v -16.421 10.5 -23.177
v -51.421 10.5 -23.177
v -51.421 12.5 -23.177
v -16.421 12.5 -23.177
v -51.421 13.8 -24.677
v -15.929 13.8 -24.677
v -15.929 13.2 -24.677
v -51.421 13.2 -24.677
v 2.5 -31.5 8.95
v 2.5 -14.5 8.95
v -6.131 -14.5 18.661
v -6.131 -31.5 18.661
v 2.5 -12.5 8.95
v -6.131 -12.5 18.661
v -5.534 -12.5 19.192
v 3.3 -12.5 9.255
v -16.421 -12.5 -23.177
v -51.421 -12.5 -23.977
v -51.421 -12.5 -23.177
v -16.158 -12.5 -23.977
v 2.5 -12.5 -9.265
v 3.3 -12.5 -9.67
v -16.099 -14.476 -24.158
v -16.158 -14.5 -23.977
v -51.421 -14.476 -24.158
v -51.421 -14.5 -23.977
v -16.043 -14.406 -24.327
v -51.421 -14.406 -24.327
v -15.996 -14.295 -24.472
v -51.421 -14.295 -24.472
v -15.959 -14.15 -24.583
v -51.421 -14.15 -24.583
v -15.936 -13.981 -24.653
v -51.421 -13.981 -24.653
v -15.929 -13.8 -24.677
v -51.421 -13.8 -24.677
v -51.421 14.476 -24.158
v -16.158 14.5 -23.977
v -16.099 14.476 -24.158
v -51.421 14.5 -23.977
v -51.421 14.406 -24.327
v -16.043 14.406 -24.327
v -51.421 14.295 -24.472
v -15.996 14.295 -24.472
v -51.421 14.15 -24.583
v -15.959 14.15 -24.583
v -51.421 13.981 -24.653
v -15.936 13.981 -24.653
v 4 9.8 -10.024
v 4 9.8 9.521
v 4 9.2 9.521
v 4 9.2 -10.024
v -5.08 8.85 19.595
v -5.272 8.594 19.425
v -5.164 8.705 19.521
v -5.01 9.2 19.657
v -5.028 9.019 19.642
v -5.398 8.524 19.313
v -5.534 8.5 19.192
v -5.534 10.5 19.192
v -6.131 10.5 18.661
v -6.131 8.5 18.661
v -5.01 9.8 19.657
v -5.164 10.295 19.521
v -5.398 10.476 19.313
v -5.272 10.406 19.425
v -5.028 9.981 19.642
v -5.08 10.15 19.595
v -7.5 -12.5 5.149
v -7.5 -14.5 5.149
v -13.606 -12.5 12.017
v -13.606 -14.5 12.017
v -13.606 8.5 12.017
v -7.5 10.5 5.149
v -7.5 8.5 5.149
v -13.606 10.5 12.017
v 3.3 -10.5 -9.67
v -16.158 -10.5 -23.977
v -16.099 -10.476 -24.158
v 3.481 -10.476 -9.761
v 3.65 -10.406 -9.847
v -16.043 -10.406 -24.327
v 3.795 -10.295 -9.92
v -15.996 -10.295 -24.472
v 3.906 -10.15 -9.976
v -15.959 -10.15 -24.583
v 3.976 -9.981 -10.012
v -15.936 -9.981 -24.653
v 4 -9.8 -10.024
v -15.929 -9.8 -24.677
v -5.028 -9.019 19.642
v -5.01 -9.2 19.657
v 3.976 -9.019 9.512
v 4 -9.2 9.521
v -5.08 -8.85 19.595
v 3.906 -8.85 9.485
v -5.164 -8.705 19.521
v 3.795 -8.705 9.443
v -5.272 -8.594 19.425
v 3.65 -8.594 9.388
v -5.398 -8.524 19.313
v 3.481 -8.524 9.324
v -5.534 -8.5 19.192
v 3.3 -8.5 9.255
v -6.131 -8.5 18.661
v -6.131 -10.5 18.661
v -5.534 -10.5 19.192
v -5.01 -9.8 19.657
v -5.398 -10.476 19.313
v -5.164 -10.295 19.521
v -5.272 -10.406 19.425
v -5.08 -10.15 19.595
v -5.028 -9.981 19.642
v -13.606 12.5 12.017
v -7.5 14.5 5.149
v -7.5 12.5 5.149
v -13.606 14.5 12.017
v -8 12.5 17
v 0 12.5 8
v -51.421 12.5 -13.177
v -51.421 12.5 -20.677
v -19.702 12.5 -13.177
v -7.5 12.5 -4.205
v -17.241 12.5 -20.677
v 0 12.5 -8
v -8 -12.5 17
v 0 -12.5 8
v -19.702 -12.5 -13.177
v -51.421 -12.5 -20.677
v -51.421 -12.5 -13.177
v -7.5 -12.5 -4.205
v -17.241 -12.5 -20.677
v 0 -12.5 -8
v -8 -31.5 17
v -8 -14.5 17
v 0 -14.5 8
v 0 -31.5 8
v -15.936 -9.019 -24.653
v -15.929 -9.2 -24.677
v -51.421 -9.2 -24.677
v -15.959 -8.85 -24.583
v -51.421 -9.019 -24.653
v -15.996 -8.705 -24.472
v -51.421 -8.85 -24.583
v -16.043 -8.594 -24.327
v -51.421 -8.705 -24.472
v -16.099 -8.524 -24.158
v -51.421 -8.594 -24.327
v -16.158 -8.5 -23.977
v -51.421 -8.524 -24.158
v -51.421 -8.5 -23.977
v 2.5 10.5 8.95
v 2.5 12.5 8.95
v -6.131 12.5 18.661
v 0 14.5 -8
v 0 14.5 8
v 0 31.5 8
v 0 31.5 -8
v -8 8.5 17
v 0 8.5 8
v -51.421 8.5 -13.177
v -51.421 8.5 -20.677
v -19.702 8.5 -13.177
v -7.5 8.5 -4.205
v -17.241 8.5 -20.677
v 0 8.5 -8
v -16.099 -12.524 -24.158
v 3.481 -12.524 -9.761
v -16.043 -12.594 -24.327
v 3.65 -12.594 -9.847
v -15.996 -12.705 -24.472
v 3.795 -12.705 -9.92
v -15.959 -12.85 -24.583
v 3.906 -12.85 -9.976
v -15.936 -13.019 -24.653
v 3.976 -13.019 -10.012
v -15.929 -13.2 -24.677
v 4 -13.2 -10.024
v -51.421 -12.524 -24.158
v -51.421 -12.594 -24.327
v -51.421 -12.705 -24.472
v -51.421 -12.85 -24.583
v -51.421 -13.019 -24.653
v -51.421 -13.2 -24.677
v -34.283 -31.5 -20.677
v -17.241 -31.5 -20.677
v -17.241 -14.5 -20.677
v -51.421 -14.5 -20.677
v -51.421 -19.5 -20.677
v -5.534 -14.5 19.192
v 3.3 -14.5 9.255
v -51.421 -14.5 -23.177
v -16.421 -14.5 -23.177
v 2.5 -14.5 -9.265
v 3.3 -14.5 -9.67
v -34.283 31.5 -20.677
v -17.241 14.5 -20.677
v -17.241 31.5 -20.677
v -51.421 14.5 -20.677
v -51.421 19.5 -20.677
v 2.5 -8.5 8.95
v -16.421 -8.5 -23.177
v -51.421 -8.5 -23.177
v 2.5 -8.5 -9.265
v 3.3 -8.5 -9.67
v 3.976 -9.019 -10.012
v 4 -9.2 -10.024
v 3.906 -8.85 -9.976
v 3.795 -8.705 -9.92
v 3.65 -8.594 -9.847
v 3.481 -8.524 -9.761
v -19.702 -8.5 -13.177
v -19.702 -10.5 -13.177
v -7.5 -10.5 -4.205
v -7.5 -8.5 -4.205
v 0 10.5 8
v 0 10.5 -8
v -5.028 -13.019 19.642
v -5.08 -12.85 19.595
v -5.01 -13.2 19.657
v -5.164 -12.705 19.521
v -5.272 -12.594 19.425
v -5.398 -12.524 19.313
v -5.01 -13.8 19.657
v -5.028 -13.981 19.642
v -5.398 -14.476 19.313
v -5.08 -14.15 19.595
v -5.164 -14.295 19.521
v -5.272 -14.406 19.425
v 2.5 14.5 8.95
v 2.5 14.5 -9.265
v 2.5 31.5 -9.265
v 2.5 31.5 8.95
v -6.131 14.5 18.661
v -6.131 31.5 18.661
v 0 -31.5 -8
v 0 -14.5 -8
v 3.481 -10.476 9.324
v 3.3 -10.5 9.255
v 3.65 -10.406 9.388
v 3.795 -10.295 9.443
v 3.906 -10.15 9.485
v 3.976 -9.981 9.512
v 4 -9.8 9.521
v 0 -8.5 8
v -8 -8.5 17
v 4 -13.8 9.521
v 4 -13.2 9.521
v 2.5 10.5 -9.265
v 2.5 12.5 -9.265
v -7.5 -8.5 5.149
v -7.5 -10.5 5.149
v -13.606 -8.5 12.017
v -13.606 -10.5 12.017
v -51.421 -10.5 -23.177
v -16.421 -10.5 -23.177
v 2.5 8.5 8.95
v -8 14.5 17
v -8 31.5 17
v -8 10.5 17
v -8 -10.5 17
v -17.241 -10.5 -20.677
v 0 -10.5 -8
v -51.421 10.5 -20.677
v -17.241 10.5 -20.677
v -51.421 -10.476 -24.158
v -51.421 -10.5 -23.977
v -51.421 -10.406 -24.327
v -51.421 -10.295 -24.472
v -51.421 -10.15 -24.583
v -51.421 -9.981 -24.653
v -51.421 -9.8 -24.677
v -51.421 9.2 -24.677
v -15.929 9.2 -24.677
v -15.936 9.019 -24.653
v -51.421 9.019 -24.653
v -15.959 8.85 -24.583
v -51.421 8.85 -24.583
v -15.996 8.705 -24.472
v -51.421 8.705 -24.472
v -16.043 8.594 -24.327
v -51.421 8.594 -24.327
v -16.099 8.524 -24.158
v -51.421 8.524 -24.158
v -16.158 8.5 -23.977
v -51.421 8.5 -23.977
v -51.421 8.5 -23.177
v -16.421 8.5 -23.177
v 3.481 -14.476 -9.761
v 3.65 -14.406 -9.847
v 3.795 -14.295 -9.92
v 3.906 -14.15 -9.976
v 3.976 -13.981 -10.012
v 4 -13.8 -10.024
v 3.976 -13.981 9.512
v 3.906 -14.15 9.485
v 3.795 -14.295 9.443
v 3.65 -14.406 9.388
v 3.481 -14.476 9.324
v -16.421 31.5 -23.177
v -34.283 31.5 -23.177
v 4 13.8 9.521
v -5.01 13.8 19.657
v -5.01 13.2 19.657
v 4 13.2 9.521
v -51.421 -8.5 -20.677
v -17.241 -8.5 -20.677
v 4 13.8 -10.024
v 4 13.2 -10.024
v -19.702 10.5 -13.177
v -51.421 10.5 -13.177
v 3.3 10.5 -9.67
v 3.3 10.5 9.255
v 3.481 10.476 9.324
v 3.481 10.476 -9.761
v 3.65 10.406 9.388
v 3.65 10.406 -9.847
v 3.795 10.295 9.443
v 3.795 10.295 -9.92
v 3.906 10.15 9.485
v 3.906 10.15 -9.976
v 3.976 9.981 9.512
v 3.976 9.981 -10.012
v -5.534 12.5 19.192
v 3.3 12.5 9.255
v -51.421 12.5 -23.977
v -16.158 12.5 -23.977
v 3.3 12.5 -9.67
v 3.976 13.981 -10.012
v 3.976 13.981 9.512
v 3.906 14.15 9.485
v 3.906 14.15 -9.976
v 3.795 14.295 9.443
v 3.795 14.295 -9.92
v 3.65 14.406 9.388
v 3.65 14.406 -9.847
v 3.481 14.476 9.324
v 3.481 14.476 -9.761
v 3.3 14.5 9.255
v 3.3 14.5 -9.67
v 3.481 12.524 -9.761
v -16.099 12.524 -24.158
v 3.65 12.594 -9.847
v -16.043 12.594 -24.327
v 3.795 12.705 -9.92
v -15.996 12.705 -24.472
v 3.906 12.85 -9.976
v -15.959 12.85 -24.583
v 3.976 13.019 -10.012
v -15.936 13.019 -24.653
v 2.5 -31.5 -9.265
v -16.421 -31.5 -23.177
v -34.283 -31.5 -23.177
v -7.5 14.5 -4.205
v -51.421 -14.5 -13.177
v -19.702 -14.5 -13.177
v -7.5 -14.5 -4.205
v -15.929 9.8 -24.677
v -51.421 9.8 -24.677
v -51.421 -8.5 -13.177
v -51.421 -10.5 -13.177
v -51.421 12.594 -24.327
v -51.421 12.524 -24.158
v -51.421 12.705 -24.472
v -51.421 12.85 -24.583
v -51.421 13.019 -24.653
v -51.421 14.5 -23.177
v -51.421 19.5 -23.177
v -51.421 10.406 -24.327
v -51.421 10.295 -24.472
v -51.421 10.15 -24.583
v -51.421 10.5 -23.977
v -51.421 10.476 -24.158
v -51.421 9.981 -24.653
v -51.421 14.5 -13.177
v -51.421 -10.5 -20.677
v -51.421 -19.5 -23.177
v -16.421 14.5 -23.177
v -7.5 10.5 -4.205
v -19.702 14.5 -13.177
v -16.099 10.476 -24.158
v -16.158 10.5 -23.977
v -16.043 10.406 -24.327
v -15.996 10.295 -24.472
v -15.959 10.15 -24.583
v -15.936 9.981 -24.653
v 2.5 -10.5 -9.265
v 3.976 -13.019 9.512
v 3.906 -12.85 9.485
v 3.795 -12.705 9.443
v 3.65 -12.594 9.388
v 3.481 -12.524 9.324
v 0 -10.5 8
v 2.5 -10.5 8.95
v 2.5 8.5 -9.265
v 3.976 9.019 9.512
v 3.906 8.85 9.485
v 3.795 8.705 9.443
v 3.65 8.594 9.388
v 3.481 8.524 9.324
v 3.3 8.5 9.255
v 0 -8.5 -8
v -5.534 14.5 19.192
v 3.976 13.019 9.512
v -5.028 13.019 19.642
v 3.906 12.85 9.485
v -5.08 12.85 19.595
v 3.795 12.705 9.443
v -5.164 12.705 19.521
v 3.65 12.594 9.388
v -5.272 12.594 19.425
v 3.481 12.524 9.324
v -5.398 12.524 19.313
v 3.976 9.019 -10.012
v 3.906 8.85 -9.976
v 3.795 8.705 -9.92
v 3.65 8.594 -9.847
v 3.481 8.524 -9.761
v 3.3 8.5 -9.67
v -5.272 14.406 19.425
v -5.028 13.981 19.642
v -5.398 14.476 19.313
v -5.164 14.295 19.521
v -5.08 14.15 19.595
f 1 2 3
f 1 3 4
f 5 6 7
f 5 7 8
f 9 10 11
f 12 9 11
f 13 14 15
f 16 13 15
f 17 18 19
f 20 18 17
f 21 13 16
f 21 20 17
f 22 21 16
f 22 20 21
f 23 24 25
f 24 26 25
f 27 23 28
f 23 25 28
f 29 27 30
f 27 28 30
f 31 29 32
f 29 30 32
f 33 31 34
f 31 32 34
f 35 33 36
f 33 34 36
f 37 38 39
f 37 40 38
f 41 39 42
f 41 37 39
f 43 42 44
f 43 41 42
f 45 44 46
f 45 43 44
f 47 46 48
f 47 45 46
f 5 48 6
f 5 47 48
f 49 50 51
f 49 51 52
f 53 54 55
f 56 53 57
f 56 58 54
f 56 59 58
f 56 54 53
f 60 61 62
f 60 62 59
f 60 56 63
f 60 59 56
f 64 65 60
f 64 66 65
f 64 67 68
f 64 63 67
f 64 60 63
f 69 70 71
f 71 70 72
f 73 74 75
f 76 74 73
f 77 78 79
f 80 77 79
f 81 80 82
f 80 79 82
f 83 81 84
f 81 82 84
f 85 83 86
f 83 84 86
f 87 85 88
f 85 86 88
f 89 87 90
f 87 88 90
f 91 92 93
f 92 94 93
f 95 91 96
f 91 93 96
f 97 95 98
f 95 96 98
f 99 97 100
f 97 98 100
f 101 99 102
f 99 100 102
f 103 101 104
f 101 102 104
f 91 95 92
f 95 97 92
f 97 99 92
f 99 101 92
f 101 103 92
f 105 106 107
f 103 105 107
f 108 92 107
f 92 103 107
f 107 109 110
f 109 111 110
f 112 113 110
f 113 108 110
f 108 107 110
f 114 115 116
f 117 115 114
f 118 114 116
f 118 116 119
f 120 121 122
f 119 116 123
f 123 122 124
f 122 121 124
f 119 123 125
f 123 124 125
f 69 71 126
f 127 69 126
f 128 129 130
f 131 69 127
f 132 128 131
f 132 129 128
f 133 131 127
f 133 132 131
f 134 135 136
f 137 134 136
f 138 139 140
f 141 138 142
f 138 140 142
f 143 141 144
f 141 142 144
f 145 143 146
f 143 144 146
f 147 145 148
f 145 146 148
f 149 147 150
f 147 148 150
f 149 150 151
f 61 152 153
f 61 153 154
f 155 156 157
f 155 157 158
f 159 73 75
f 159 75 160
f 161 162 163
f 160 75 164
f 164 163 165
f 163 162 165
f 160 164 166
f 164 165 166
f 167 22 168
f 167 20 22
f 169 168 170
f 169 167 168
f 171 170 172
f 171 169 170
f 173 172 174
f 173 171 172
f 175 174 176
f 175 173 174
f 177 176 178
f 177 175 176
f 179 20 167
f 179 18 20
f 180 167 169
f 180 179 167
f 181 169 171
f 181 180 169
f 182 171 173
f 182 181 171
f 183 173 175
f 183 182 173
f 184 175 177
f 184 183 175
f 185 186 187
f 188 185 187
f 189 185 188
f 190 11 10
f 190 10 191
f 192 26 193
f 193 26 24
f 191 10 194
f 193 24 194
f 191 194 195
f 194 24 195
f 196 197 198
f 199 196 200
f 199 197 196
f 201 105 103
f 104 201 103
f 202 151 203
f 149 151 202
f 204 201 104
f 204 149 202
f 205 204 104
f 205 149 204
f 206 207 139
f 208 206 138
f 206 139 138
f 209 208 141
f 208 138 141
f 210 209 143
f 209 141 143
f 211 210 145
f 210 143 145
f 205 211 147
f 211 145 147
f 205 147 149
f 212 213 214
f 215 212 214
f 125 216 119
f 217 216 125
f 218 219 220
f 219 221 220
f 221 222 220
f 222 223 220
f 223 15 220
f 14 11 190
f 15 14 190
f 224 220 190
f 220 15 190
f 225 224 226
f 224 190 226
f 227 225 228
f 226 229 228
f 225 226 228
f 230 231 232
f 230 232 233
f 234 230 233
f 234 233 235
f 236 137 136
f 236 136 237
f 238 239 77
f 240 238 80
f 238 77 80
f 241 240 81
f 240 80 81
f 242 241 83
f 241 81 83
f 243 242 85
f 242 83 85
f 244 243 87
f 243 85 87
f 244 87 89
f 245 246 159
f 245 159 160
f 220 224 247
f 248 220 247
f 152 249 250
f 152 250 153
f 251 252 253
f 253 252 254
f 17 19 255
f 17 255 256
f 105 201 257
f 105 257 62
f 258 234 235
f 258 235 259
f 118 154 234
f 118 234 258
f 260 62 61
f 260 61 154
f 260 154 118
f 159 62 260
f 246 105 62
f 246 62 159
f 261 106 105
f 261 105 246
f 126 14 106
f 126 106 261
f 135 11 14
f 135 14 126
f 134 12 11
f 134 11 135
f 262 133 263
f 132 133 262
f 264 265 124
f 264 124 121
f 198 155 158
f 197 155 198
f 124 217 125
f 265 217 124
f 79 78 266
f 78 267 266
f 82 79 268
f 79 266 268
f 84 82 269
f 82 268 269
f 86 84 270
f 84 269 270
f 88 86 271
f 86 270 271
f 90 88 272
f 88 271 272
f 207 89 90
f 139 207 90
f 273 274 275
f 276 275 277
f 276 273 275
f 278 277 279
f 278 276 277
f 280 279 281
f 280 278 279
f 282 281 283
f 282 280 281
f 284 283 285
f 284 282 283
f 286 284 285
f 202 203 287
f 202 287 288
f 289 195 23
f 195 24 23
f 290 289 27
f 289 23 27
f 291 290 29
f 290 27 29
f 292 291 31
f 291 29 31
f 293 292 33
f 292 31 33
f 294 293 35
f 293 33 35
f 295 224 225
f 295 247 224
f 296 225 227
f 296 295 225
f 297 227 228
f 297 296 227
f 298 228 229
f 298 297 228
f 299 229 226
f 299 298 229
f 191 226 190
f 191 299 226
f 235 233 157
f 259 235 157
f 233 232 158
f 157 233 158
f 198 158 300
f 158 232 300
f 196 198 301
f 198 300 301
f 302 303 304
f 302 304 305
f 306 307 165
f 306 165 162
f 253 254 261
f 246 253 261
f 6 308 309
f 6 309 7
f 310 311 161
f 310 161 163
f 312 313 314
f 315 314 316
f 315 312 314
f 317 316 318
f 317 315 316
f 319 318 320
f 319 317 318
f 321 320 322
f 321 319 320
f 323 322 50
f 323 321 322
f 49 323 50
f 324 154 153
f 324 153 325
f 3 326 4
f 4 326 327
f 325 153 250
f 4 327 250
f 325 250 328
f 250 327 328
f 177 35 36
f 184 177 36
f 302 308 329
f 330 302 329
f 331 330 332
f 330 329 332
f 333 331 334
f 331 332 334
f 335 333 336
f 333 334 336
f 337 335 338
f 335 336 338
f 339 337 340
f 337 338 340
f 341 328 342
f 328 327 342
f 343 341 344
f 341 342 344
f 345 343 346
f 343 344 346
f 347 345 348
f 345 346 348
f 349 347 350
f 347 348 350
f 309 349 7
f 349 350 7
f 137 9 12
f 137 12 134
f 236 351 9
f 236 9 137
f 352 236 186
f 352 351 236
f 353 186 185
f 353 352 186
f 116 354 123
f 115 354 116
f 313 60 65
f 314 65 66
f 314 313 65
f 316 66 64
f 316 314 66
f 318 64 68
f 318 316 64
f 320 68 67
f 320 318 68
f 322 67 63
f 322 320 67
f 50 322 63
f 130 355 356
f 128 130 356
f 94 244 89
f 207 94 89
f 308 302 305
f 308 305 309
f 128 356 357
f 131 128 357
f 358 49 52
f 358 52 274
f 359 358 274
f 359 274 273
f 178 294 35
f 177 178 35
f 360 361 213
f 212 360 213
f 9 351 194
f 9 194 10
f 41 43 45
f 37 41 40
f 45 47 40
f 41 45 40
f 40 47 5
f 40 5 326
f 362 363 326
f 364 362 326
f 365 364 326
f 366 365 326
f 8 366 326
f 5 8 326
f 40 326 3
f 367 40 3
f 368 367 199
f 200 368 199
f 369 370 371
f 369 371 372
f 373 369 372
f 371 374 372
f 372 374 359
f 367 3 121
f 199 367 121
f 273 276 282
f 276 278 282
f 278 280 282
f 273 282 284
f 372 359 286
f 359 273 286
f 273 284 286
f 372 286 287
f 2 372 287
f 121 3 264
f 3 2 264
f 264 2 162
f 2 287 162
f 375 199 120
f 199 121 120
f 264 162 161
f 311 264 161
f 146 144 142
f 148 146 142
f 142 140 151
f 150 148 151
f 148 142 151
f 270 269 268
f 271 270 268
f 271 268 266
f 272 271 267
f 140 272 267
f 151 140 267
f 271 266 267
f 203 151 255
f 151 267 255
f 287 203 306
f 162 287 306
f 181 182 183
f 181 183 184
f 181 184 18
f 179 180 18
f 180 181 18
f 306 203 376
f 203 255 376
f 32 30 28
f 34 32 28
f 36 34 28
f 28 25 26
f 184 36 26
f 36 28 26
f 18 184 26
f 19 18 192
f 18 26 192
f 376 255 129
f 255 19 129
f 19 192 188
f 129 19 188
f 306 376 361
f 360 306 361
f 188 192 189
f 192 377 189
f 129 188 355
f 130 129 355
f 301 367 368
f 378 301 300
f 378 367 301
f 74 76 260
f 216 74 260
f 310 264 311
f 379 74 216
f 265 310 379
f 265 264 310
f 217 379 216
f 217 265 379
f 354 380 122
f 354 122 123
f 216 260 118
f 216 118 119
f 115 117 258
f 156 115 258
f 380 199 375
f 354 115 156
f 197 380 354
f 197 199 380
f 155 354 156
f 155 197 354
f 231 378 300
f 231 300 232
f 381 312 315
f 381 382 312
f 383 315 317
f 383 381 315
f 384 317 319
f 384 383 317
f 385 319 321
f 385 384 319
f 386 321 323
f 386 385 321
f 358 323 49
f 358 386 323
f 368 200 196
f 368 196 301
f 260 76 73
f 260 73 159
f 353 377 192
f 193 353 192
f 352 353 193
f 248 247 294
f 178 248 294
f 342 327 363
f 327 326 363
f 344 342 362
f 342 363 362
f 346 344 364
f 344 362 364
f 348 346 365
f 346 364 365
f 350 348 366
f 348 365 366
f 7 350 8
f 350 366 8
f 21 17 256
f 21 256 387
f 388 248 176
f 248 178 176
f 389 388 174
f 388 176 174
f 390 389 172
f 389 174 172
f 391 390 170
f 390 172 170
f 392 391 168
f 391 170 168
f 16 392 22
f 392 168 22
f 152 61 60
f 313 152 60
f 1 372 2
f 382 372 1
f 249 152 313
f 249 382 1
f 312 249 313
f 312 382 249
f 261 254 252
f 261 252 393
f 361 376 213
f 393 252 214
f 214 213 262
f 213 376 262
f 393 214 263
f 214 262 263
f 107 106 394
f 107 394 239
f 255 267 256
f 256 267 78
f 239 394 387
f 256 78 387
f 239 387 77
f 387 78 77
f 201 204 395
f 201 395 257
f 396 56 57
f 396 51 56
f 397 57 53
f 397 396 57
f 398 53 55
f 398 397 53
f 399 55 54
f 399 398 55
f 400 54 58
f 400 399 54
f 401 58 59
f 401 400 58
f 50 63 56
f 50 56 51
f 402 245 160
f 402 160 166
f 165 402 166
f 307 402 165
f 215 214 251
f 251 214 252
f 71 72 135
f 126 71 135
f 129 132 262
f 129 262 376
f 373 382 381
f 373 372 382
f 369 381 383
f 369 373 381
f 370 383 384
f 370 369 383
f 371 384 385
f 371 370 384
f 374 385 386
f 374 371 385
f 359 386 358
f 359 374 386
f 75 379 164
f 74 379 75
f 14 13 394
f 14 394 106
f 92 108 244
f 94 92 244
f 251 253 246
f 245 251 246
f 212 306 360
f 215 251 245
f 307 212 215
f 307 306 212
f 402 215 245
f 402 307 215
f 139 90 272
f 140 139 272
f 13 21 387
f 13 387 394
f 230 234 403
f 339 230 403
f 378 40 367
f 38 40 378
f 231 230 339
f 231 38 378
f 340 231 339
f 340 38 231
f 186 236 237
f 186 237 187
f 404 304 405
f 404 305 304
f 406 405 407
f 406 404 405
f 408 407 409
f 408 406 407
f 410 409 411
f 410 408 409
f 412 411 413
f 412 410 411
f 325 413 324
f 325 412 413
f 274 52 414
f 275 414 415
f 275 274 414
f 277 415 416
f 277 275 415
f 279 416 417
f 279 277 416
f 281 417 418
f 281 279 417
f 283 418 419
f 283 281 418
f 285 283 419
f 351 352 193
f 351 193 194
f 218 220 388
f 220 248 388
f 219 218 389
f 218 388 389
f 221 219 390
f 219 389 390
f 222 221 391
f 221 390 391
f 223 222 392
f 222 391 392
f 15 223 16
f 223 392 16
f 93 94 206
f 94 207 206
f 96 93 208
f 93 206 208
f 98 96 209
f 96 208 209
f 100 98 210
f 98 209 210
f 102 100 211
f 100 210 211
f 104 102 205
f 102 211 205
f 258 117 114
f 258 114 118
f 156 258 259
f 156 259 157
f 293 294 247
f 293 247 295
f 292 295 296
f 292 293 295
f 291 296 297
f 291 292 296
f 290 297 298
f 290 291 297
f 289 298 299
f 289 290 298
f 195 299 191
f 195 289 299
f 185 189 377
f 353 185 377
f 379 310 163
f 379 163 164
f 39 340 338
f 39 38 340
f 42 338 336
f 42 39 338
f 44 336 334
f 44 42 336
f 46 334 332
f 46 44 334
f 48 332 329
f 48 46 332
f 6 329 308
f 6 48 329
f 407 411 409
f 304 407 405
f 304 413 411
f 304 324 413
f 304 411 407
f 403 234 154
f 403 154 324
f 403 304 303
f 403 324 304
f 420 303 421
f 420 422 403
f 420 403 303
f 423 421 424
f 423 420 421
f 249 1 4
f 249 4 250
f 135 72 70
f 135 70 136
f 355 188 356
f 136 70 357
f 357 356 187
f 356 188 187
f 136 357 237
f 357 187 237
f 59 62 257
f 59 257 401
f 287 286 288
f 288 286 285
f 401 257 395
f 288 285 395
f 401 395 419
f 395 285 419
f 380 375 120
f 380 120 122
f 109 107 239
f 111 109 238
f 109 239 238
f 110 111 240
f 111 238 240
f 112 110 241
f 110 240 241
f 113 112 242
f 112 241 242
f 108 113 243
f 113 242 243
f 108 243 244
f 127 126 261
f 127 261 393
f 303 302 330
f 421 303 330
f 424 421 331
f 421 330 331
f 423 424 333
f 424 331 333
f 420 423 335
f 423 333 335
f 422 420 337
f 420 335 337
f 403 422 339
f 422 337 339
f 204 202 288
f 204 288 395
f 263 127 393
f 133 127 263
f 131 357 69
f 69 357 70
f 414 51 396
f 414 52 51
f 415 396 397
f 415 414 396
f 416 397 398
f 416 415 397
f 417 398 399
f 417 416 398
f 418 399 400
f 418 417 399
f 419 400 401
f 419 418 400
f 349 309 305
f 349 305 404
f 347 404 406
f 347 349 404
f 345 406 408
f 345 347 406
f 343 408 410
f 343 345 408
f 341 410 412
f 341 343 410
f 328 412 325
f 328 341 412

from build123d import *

# Parameters (mm, degrees)
EXTRUDE_1_DEPTH        = 31.5
EXTRUDE_1_DEPTH_BACK   = 31.5
CHAMFER_1_SIZE         = 12
CHAMFER_1_SIZE2        = 17.137776081
EXTRUDE_1_2_DEPTH      = 2
EXTRUDE_2_DEPTH        = 2
FILLET_1_R             = 0.7
FILLET_1_OF_MIRROR_1_R = 0.7


with BuildPart() as part:
    # 草图1 → Extrude 1 (new, two sides: drawn at the far end of the back side and taken through both)
    with BuildSketch(Plane(origin=(0, 0, 0), x_dir=(1, 0, 0), z_dir=(0, 1, 0)).offset(-EXTRUDE_1_DEPTH_BACK)):
        Polygon((0, -8), (0, 8), (-17.240931671, 20.67715564), (-51.420742101, 20.67715564), (-51.420742101, 23.17715564), (-16.420742101, 23.17715564), (2.5, 9.264845271), (2.5, -8.950498306), (-6.131476703, -18.660909597), (-8, -17), align=None)
    extrude(amount=EXTRUDE_1_DEPTH + EXTRUDE_1_DEPTH_BACK)

    # 倒角1
    chamfer_1_edges = [part.edges().sort_by_distance(p)[0] for p in [
        (-51.420742101, -31.5, -21.92715564),
        (-51.420742101, 31.5, -21.92715564),
    ]]
    chamfer_1_side = [part.faces().sort_by_distance(p)[0] for p in [
        (-51.420742101, 0, -21.92715564),
    ]]
    chamfer(chamfer_1_edges, length=CHAMFER_1_SIZE, length2=CHAMFER_1_SIZE2, reference=chamfer_1_side[0])

    # 草图4 → Extrude 1 2 (add)
    with BuildSketch(Plane(origin=(0, 10.5, 0), x_dir=(1, 0, 0), z_dir=(0, 1, 0))):
        Polygon((-6.131476703, -18.660909597), (2.5, -8.950498306), (2.5, 9.264845271), (-16.420742101, 23.17715564), (-34.282966021, 23.17715564), (-51.420742101, 23.17715564), (-51.420742101, 13.17715564), (-34.282966021, 13.17715564), (-19.701500378, 13.17715564), (-7.5, 4.205464186), (-7.5, -5.148505082), (-13.60556989, -12.017271209), align=None)
        Polygon((-5.010362725, -19.657455355), (4, -9.520797289), (4, 10.023752434), (-15.92862836, 24.67715564), (-34.282966021, 24.67715564), (-51.420742101, 24.67715564), (-51.420742101, 14.67715564), (-34.282966021, 14.67715564), (-19.209386637, 14.67715564), (-6, 4.964371348), (-6, -5.718804066), (-12.484455912, -13.013816967), align=None)
    extrude_1_2 = extrude(amount=-EXTRUDE_1_2_DEPTH)

    # 草图5 → 拉伸-薄壁2 (add)
    with BuildSketch(Plane(origin=(0, 14.5, 0), x_dir=(1, 0, 0), z_dir=(0, 1, 0))):
        Polygon((-6.131476703, -18.660909597), (2.5, -8.950498306), (2.5, 9.264845271), (-16.420742101, 23.17715564), (-34.282966021, 23.17715564), (-51.420742101, 23.17715564), (-51.420742101, 13.17715564), (-34.282966021, 13.17715564), (-19.701500378, 13.17715564), (-7.5, 4.205464186), (-7.5, -5.148505082), (-13.60556989, -12.017271209), align=None)
        Polygon((-5.010362725, -19.657455355), (4, -9.520797289), (4, 10.023752434), (-15.92862836, 24.67715564), (-34.282966021, 24.67715564), (-51.420742101, 24.67715564), (-51.420742101, 14.67715564), (-34.282966021, 14.67715564), (-19.209386637, 14.67715564), (-6, 4.964371348), (-6, -5.718804066), (-12.484455912, -13.013816967), align=None)
    extrude_2 = extrude(amount=-EXTRUDE_2_DEPTH)

    # 圆角1
    fillet_1_edges = [part.edges().sort_by_distance(p)[0] for p in [
        (-33.674685231, 12.5, -24.67715564),
        (-5.96431418, 12.5, -17.350454037),
        (4, 12.5, -0.251477572),
        (-0.505181363, 12.5, 14.589126322),
        (-33.674685231, 14.5, -24.67715564),
        (-5.96431418, 14.5, -17.350454037),
        (4, 14.5, -0.251477572),
        (-0.505181363, 14.5, 14.589126322),
        (-33.674685231, 8.5, -24.67715564),
        (-5.96431418, 8.5, -17.350454037),
        (4, 8.5, -0.251477572),
        (-0.505181363, 8.5, 14.589126322),
        (-33.674685231, 10.5, -24.67715564),
        (-5.96431418, 10.5, -17.350454037),
        (4, 10.5, -0.251477572),
        (-0.505181363, 10.5, 14.589126322),
    ]]
    fillet(fillet_1_edges, radius=FILLET_1_R)

    # 镜向1: Extrude 1 2, 拉伸-薄壁2 across plane
    add(extrude_1_2.mirror(Plane.ZX))
    add(extrude_2.mirror(Plane.ZX))

    # 圆角1 of 镜向1
    fillet_1_of_mirror_1_edges = [part.edges().sort_by_distance(p)[0] for p in [
        (-33.674685231, -12.5, -24.67715564),
        (-5.96431418, -12.5, -17.350454037),
        (4, -12.5, -0.251477572),
        (-0.505181363, -12.5, 14.589126322),
        (-33.674685231, -14.5, -24.67715564),
        (-5.96431418, -14.5, -17.350454037),
        (4, -14.5, -0.251477572),
        (-0.505181363, -14.5, 14.589126322),
        (-33.674685231, -8.5, -24.67715564),
        (-5.96431418, -8.5, -17.350454037),
        (4, -8.5, -0.251477572),
        (-0.505181363, -8.5, 14.589126322),
        (-33.674685231, -10.5, -24.67715564),
        (-5.96431418, -10.5, -17.350454037),
        (4, -10.5, -0.251477572),
        (-0.505181363, -10.5, 14.589126322),
    ]]
    fillet(fillet_1_of_mirror_1_edges, radius=FILLET_1_OF_MIRROR_1_R)


solid = part.part
